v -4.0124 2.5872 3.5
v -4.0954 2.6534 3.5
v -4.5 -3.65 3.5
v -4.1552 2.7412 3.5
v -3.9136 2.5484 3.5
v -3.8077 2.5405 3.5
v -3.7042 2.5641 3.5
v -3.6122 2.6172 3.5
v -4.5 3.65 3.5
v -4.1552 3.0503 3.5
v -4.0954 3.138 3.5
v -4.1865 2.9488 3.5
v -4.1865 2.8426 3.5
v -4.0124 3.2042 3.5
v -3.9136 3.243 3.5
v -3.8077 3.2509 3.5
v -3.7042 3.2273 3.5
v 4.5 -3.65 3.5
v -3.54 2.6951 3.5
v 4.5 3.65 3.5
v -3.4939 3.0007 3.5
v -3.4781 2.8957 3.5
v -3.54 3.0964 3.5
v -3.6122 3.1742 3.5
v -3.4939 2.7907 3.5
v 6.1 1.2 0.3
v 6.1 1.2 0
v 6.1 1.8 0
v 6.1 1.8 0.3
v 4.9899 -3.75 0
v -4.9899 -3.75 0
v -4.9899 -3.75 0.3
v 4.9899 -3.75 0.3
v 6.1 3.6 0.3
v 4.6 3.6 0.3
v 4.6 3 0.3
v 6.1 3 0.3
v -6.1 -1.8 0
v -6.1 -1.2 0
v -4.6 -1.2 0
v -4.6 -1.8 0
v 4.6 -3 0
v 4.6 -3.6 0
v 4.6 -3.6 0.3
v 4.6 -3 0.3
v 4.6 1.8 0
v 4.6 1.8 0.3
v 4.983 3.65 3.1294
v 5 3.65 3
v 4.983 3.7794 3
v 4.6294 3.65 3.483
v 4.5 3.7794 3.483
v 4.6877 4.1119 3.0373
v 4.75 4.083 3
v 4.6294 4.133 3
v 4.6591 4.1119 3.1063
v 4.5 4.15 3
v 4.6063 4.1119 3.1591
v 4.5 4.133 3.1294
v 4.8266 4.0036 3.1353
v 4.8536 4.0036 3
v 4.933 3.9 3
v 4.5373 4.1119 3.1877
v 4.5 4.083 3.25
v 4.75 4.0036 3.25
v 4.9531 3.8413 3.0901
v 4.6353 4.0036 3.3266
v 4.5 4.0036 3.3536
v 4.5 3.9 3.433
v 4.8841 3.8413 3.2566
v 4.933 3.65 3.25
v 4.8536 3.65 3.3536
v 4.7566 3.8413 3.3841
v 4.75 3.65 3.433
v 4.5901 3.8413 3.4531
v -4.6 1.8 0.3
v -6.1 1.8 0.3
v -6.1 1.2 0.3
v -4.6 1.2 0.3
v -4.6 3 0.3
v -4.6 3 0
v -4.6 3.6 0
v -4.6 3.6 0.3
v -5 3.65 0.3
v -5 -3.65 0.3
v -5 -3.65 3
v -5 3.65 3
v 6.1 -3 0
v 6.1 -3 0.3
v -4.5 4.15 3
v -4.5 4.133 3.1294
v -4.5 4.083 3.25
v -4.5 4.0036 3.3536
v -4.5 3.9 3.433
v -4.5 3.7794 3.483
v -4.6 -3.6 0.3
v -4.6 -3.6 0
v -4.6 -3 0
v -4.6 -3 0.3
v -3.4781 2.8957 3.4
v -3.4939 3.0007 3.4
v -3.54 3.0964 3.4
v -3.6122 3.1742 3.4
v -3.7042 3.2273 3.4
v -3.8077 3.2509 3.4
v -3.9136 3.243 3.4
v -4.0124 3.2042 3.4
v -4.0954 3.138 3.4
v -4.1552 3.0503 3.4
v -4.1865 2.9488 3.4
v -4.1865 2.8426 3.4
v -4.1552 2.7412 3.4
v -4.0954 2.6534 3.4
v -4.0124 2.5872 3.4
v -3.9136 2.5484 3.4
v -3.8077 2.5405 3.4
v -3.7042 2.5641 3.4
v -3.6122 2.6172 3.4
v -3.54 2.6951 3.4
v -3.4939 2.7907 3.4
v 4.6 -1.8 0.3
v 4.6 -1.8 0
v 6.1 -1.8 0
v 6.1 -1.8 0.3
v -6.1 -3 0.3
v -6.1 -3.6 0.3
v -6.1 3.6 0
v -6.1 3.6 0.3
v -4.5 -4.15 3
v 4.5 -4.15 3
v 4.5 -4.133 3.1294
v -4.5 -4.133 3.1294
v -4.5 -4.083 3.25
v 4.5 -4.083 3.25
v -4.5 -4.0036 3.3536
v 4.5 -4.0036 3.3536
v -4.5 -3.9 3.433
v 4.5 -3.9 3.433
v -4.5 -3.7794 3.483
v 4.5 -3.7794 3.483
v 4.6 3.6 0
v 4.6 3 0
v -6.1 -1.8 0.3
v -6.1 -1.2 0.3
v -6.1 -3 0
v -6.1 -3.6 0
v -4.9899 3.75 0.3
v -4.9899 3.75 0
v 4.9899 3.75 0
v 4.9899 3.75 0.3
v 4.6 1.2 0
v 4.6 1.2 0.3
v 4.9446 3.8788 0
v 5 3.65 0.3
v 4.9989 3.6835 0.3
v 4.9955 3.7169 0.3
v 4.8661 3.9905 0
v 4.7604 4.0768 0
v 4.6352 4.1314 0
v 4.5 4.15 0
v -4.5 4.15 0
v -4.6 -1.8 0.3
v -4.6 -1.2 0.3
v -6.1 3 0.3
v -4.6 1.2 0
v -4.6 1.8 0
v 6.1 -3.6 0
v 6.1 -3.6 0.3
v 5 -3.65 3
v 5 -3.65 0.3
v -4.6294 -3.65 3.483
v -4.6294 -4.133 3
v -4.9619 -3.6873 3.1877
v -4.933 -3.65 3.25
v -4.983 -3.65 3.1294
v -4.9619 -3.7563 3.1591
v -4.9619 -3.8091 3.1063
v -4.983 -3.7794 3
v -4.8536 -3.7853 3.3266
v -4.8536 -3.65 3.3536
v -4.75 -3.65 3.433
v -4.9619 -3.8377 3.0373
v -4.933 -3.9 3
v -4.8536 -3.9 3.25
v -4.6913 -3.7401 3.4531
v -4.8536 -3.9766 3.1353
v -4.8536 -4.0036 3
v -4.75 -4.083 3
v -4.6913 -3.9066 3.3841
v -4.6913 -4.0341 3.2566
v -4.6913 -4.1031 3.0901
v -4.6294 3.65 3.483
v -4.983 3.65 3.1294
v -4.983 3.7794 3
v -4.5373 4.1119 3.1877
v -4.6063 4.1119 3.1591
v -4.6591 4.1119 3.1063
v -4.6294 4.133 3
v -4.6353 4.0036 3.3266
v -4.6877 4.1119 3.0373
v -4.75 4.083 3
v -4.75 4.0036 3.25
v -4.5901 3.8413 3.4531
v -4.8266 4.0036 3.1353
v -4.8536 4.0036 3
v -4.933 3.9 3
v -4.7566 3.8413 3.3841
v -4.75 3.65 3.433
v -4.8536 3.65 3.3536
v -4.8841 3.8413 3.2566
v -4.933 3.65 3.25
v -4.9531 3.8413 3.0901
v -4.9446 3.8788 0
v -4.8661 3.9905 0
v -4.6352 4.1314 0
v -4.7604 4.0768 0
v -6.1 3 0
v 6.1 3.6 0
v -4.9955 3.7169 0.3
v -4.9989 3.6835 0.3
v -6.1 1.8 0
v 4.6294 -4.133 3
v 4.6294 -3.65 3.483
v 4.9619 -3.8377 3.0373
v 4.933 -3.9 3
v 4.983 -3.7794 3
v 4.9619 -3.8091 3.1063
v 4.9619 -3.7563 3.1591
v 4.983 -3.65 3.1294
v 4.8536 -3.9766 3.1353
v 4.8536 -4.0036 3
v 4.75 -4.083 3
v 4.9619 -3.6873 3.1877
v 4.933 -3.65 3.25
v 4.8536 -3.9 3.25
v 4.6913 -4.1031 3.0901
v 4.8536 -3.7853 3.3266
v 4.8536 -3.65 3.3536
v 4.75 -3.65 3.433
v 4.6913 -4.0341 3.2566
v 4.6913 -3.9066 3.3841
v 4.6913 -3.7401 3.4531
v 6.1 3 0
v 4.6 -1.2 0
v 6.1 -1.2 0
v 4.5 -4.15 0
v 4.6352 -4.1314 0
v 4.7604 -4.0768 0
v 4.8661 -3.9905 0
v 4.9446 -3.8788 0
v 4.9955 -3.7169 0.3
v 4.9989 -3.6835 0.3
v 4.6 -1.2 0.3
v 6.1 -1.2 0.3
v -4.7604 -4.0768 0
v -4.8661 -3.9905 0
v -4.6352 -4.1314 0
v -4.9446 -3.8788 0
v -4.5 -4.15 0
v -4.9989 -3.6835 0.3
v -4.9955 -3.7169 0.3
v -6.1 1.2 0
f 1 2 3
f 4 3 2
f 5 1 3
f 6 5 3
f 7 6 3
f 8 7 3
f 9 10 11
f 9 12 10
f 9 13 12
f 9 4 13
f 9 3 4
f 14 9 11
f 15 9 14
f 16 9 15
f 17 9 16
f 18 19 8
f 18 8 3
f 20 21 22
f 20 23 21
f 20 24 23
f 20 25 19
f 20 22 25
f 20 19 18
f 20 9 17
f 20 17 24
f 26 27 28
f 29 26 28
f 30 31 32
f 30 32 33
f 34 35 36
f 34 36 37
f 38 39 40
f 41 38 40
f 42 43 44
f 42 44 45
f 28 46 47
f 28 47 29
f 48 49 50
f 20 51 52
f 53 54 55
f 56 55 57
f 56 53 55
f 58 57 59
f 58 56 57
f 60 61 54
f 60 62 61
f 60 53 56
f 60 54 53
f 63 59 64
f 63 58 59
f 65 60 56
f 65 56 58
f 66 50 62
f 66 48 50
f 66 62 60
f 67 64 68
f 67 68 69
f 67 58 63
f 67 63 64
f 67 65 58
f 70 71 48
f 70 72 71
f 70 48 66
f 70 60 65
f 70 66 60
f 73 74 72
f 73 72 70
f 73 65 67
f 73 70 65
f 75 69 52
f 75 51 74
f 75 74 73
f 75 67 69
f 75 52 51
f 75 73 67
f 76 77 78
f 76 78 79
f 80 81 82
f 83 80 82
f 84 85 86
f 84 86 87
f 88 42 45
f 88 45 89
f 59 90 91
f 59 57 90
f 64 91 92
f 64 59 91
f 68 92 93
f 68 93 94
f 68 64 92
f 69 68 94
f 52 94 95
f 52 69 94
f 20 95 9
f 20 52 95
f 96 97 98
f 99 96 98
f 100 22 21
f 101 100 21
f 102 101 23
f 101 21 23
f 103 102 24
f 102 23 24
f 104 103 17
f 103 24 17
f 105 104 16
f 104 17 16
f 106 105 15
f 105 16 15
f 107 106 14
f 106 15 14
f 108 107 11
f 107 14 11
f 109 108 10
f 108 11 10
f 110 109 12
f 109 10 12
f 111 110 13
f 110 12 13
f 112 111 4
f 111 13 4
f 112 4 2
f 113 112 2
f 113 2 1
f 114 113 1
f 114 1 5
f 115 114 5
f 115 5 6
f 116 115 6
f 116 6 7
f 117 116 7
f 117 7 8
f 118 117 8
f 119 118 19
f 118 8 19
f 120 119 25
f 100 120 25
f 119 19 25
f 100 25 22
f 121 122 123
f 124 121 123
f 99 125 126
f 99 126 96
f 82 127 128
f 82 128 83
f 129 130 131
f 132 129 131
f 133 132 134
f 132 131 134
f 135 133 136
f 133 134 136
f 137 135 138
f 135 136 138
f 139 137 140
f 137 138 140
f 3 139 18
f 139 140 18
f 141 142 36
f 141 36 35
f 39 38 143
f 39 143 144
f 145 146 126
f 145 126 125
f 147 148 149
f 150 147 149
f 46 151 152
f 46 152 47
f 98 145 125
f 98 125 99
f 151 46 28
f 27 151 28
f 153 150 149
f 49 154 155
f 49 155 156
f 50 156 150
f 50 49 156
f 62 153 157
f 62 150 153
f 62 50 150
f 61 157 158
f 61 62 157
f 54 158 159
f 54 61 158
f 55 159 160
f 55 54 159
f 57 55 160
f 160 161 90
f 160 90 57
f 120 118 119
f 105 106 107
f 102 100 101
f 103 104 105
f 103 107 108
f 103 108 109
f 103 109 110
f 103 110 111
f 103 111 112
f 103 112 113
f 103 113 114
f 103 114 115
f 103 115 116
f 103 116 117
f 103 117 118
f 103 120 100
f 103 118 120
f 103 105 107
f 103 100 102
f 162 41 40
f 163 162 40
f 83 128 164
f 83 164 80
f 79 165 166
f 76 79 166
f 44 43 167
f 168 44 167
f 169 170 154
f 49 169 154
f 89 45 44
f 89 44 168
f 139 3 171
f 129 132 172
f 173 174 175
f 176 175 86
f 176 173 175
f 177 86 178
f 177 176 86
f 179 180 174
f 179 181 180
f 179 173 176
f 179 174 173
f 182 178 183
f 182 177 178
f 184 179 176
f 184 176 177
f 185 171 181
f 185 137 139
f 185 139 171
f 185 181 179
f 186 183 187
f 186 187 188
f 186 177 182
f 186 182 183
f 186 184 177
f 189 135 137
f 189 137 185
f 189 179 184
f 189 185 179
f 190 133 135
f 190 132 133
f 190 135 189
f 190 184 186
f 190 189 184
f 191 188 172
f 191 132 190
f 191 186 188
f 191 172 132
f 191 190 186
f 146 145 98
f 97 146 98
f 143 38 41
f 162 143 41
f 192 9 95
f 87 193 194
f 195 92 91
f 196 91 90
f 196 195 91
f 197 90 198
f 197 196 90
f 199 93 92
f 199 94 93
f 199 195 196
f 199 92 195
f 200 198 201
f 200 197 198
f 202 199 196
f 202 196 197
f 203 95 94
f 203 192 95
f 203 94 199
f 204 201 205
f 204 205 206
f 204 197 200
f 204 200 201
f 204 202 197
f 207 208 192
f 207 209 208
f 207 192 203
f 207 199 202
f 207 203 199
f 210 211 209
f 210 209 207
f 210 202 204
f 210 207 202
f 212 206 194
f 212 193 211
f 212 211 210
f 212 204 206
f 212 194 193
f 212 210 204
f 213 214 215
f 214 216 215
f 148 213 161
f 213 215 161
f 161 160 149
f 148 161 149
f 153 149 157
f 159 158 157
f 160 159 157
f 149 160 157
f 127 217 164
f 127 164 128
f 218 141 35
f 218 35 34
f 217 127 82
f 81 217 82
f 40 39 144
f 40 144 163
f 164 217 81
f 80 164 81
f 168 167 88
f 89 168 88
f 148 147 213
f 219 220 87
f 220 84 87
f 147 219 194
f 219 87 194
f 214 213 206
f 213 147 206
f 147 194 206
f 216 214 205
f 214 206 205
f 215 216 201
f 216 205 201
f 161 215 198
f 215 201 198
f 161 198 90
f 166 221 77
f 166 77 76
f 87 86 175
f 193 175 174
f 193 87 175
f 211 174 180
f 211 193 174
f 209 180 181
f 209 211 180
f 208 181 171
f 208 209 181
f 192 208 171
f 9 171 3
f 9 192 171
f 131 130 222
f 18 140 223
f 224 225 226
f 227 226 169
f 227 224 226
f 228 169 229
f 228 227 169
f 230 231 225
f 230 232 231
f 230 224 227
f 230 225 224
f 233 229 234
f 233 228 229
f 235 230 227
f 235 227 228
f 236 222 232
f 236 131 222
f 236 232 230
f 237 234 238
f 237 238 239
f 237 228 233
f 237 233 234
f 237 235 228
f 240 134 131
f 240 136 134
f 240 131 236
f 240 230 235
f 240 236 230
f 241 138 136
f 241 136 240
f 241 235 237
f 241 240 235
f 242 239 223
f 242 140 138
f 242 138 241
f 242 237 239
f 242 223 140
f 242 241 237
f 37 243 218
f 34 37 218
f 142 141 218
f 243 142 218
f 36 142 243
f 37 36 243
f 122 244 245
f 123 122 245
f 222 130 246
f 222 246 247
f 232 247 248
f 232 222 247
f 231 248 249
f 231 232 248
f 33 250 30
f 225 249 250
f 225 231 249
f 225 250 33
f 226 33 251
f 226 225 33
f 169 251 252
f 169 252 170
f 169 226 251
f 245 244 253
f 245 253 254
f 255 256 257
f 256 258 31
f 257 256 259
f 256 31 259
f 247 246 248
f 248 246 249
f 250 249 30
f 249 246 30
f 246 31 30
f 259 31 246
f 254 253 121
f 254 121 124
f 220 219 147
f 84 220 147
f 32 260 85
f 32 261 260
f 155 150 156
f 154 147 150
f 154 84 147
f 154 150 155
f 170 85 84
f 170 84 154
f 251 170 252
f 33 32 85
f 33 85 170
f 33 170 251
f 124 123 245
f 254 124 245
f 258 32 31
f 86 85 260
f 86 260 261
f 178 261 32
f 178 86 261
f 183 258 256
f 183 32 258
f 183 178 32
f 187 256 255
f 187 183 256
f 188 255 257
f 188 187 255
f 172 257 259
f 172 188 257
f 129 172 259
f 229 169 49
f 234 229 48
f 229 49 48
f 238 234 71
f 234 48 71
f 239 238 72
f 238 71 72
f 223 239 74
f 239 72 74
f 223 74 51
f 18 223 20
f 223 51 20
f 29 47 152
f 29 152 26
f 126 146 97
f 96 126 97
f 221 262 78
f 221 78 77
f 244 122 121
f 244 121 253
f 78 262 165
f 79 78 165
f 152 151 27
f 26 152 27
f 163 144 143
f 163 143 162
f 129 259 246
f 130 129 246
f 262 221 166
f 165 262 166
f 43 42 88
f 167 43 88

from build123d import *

# Parameters (mm, degrees)
SKETCH_W        = 10
SKETCH_H        = 8.3
PAD_DEPTH       = 3.5
FILLET_R        = 0.5
SKETCH002_W     = 12.582096
SKETCH002_H     = 7.5
POCKET_DEPTH    = 0.3
SKETCH003_R     = 0.356211
POCKET001_DEPTH = 0.1
SKETCH001_W     = 1.5
SKETCH001_H     = 0.6
PAD001_DEPTH    = 0.3


with BuildPart() as body:
    # Sketch → Pad (new body)
    with BuildSketch(Plane.XY):
        Rectangle(SKETCH_W, SKETCH_H)
    extrude(amount=PAD_DEPTH)

    # Fillet
    fillet_edges = [body.edges().sort_by_distance(p)[0] for p in [
        (0, -4.15, 3.5),
        (-5, 0, 3.5),
        (-5, -4.15, 1.75),
        (5, -4.15, 1.75),
        (5, 0, 3.5),
        (5, 4.15, 1.75),
        (0, 4.15, 3.5),
        (-5, 4.15, 1.75),
    ]]
    fillet(fillet_edges, radius=FILLET_R)

    # Sketch002 (on Face2 of Fillet) → Pocket (cut)
    with BuildSketch(Plane(origin=(0, 0, 0), x_dir=(1, 0, 0), z_dir=(0, 0, -1))):
        Rectangle(SKETCH002_W, SKETCH002_H)
    extrude(amount=-POCKET_DEPTH, mode=Mode.SUBTRACT)

    # Sketch003 → Pocket001 (cut)
    with BuildSketch(Plane.XY.offset(3.5)):
        with Locations((-3.834304, 2.895721)):
            Circle(SKETCH003_R)
    extrude(amount=-POCKET001_DEPTH, mode=Mode.SUBTRACT)


with BuildPart() as body001:
    # Sketch001 → Pad001 (new body)
    with BuildSketch(Plane.XY):
        with Locations((-5.35, 3.3)):
            Rectangle(SKETCH001_W, SKETCH001_H)
        with Locations((-5.35, 1.5)):
            Rectangle(SKETCH001_W, SKETCH001_H)
        with Locations((-5.35, -1.5)):
            Rectangle(SKETCH001_W, SKETCH001_H)
        with Locations((5.35, 3.3)):
            Rectangle(SKETCH001_W, SKETCH001_H)
        with Locations((5.35, 1.5)):
            Rectangle(SKETCH001_W, SKETCH001_H)
        with Locations((5.35, -1.5)):
            Rectangle(SKETCH001_W, SKETCH001_H)
        with Locations((5.35, -3.3)):
            Rectangle(SKETCH001_W, SKETCH001_H)
        with Locations((-5.35, -3.3)):
            Rectangle(SKETCH001_W, SKETCH001_H)
    extrude(amount=PAD001_DEPTH)


solid = Compound([body.part, body001.part])
